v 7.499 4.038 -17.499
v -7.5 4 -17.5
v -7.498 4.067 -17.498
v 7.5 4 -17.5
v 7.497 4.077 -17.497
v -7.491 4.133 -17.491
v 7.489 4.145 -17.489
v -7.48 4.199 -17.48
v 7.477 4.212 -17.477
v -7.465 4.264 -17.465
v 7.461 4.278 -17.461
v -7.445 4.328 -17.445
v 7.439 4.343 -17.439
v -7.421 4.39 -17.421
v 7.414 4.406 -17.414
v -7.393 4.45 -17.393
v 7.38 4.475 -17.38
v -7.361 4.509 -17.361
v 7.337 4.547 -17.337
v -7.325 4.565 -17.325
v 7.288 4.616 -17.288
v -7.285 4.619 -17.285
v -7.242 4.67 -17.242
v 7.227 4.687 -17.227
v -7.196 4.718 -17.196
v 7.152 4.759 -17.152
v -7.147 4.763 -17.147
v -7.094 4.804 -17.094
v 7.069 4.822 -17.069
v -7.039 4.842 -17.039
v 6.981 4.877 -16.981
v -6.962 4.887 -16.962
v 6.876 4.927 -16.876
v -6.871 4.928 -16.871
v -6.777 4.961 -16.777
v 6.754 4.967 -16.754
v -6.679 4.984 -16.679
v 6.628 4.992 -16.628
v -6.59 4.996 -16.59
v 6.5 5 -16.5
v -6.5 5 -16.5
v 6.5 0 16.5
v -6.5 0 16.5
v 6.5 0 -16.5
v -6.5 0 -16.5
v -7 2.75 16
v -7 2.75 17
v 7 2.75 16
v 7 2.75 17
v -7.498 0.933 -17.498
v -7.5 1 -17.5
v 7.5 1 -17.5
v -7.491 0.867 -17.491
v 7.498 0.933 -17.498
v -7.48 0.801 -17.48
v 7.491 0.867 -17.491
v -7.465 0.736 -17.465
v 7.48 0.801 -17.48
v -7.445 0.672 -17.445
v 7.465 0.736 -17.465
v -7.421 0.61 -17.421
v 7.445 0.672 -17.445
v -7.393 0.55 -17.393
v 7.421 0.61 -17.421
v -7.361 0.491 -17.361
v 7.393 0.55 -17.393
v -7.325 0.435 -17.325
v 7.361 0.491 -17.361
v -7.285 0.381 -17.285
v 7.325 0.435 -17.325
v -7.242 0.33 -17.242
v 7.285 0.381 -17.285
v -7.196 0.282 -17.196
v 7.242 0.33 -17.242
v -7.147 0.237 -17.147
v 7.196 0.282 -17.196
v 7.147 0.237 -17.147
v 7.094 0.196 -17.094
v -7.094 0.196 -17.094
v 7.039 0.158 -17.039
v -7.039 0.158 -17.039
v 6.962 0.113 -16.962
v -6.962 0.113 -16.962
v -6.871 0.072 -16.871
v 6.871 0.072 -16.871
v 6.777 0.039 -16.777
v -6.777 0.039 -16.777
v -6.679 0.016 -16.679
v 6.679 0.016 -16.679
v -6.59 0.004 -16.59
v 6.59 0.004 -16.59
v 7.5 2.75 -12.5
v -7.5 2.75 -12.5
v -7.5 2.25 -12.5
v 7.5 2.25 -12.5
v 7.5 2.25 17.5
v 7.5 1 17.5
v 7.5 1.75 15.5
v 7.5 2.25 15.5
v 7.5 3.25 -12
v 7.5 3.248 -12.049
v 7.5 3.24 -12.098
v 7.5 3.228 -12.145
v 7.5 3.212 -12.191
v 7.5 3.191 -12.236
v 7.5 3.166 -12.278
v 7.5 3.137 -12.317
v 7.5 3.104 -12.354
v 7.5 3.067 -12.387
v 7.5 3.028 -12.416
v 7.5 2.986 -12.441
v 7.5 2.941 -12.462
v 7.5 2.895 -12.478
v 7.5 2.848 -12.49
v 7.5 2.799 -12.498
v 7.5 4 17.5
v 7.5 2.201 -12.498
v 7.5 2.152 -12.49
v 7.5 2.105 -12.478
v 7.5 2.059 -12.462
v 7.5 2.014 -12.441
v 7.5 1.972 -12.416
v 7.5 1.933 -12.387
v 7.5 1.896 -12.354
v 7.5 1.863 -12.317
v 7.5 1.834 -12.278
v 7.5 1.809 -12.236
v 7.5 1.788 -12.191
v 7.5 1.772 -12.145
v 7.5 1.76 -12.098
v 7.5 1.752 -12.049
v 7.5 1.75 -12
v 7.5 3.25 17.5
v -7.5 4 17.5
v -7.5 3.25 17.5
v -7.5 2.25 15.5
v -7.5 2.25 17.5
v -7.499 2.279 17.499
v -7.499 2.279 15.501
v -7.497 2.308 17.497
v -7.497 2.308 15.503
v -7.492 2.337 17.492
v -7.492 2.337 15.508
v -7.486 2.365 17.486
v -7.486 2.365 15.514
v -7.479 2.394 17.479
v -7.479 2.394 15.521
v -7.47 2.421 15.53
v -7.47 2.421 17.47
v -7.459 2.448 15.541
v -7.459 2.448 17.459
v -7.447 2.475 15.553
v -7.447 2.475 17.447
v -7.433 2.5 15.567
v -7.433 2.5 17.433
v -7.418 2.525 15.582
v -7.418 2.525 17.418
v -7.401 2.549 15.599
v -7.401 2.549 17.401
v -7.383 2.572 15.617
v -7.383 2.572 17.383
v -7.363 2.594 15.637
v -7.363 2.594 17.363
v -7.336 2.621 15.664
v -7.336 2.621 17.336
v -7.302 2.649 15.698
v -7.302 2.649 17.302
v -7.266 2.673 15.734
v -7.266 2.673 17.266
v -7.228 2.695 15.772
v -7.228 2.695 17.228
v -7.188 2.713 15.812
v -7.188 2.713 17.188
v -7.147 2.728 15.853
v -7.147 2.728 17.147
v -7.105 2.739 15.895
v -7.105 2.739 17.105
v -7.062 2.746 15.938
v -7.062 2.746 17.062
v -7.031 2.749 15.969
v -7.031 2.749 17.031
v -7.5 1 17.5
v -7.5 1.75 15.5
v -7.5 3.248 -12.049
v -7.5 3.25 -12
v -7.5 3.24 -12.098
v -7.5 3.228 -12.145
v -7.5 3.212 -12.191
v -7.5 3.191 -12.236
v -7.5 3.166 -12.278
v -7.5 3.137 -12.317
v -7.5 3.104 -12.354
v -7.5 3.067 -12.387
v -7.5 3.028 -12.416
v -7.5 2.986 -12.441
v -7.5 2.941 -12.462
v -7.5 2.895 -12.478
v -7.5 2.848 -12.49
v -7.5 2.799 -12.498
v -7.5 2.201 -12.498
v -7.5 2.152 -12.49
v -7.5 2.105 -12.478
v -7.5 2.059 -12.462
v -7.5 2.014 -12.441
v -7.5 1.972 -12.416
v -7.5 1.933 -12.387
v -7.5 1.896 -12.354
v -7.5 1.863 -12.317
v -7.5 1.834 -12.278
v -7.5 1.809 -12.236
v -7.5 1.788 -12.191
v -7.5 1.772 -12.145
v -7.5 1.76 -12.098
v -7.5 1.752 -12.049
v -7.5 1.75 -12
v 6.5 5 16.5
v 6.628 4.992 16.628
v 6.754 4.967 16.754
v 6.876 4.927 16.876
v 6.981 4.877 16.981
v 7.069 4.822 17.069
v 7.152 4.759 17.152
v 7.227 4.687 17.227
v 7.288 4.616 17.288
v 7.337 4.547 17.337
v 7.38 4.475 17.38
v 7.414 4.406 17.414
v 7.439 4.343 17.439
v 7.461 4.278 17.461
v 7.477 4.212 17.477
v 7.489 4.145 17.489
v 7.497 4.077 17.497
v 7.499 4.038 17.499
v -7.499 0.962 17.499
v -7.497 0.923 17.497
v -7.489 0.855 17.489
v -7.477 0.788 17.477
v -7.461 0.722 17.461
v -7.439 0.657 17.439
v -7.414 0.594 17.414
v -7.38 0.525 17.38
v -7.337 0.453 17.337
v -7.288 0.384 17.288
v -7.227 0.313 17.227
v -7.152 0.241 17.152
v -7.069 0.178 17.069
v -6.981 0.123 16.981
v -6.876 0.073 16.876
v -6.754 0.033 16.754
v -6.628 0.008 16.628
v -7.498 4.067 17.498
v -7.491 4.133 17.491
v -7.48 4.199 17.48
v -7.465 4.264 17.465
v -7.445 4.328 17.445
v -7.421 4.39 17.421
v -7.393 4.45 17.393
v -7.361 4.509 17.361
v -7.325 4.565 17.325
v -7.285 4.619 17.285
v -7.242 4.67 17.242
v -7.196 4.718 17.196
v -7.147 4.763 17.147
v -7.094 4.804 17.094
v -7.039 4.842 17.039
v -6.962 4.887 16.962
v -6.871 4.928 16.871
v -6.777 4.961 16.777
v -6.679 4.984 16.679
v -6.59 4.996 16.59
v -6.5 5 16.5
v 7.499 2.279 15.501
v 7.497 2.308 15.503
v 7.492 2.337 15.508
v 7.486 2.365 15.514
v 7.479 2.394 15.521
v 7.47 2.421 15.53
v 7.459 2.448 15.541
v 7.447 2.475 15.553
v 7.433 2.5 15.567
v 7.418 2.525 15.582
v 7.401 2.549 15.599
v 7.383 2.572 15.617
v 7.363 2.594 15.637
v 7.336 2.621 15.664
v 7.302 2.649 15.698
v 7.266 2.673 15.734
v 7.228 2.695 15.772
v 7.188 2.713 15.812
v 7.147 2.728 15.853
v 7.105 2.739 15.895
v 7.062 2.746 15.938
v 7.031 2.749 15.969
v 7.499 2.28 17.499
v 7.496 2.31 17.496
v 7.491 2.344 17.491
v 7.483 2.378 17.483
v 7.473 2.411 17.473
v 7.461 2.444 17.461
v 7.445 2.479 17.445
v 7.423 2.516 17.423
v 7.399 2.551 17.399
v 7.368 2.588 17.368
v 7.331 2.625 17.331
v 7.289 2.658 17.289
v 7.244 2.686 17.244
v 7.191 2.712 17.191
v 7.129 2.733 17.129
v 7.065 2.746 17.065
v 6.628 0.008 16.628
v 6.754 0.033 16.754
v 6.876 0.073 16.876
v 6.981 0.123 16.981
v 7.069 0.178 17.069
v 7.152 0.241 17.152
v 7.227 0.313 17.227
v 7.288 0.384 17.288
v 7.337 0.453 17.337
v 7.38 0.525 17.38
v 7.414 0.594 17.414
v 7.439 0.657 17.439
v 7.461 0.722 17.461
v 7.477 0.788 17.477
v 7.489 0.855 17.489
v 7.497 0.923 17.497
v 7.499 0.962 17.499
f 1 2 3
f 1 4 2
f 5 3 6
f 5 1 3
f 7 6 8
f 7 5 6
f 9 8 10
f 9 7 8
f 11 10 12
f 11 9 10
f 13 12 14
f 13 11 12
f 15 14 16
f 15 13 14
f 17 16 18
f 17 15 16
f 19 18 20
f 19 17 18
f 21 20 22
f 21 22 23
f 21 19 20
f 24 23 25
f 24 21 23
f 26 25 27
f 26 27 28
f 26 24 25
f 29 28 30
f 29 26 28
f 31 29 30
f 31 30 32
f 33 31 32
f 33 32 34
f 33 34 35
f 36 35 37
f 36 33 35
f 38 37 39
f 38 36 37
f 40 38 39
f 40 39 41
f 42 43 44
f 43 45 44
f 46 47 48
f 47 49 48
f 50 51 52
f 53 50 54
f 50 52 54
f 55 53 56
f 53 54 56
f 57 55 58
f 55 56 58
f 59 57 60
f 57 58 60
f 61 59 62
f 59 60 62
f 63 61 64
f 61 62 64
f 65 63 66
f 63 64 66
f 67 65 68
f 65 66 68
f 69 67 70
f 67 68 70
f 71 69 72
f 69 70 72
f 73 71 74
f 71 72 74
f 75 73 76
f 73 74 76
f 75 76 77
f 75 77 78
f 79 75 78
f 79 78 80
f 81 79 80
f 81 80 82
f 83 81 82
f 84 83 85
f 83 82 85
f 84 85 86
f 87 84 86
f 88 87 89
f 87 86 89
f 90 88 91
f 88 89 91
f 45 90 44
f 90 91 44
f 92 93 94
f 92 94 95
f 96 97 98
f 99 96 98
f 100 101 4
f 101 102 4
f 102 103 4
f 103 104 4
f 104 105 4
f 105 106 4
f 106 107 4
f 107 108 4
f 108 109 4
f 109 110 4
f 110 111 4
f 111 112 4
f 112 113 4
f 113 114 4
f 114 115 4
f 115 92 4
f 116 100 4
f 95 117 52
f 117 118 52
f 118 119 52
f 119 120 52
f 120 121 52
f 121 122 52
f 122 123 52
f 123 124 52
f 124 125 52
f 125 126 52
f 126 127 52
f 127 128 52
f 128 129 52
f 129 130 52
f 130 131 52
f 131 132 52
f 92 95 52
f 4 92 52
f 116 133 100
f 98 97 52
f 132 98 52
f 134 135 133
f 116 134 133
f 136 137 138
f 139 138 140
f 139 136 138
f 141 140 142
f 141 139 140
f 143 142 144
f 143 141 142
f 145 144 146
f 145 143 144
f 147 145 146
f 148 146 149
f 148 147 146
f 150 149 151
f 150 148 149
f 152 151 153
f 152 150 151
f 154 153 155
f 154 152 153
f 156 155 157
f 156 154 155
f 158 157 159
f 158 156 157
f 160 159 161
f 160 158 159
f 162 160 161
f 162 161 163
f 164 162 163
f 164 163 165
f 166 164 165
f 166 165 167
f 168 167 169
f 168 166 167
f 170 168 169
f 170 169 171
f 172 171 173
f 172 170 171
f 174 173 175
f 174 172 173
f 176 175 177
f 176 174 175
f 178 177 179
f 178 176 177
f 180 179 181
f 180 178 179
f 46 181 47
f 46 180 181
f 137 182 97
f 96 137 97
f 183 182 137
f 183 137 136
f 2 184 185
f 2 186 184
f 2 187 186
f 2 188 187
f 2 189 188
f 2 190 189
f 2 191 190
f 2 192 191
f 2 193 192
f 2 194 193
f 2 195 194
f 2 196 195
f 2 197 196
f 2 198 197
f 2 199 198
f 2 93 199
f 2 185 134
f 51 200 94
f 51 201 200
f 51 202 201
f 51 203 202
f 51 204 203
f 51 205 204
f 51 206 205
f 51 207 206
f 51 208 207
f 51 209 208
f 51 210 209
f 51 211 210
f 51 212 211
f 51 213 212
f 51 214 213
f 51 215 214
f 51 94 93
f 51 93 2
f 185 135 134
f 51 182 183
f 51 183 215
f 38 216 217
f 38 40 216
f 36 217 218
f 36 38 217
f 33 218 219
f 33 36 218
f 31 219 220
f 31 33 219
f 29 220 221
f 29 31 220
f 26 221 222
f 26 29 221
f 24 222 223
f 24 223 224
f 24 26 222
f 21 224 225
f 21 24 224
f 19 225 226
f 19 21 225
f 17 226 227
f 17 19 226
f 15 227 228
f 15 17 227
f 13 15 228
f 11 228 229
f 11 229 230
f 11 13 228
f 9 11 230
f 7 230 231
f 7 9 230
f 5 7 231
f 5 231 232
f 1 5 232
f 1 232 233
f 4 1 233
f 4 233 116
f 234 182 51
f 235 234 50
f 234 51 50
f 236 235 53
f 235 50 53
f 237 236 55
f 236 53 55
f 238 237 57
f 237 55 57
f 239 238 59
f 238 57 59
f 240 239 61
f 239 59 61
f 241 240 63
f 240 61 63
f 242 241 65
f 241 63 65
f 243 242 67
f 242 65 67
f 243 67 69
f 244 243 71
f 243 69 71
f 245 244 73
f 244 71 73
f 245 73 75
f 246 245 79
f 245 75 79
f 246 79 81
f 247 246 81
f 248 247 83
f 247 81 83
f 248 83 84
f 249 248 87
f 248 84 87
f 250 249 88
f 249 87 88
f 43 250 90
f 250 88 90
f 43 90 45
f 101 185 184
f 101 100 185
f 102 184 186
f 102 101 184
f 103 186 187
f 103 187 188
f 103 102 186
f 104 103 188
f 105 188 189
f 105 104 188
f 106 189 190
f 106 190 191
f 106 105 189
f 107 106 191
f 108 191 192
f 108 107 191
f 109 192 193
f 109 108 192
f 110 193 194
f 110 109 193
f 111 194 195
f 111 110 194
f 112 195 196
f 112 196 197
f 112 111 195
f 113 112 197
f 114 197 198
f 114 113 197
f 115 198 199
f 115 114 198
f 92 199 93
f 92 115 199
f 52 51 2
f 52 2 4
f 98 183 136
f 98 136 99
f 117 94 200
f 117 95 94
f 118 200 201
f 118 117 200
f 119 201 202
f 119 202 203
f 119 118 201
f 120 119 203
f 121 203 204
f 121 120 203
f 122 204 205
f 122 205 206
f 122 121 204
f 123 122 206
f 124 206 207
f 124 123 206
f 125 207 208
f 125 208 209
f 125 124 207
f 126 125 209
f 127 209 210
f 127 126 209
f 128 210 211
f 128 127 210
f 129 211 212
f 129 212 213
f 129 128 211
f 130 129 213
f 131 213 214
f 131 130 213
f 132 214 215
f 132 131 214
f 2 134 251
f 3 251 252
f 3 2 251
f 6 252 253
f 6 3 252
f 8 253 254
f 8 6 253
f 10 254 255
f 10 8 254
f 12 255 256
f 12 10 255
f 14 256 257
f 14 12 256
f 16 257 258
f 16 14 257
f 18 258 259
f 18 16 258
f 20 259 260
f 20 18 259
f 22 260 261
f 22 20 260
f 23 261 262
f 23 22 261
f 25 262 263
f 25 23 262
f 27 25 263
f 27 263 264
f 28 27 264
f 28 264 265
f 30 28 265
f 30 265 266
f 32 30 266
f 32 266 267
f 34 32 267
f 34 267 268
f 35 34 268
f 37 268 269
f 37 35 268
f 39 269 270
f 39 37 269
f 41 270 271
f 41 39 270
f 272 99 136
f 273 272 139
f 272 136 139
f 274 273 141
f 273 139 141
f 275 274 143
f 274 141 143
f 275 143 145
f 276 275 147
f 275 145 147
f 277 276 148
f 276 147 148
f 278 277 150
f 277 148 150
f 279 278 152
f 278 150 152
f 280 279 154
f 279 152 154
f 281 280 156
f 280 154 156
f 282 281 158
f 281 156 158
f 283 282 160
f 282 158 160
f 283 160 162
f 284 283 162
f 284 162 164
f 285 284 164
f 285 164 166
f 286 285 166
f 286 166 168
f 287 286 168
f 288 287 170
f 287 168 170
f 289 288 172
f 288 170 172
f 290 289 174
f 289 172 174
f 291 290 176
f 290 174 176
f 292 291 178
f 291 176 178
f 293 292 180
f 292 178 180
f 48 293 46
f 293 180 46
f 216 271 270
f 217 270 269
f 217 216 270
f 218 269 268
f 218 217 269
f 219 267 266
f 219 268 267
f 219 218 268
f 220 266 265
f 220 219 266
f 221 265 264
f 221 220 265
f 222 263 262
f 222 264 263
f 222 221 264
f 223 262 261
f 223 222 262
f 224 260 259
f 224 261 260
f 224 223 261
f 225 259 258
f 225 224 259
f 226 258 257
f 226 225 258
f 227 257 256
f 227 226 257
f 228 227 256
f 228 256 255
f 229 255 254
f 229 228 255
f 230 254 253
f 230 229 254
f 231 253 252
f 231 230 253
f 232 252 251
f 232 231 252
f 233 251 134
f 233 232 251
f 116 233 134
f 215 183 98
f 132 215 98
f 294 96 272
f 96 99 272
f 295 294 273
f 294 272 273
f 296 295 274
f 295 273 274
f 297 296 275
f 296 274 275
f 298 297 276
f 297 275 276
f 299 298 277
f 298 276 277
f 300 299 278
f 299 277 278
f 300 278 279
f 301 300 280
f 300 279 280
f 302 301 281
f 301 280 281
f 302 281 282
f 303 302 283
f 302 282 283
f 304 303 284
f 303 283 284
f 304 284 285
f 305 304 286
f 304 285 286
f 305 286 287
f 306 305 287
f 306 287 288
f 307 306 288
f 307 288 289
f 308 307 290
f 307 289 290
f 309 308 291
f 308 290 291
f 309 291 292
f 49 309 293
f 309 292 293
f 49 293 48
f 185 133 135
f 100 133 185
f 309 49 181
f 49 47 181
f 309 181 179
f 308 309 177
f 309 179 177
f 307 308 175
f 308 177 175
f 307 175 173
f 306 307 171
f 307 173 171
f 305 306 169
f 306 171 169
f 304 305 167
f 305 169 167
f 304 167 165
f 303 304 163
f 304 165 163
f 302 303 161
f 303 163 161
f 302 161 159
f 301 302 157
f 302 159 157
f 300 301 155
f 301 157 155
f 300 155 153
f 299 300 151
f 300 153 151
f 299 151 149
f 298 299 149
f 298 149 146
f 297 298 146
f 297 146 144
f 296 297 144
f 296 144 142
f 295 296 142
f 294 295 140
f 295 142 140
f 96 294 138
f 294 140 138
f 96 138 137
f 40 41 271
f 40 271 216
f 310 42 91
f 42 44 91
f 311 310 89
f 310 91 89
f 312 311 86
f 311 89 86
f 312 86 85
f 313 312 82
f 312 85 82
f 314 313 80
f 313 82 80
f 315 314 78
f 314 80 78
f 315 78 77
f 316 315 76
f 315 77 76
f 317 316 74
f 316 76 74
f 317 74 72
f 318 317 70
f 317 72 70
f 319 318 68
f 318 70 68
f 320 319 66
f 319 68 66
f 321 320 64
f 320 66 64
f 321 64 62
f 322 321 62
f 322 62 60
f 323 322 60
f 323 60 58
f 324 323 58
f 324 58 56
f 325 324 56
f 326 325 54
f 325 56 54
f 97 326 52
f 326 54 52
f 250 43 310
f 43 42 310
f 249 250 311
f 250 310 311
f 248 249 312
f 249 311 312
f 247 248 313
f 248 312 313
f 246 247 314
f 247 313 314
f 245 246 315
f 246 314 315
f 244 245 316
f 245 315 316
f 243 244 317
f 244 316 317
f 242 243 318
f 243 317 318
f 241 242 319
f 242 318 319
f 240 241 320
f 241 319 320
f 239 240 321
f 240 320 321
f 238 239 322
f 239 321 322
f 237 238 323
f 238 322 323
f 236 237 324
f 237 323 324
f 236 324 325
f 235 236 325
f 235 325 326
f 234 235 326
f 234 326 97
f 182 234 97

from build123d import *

# Parameters (mm, degrees)
SKETCH1_W           = 15
SKETCH1_H           = 35
BOSS_EXTRUDE1_DEPTH = 5
SKETCH4_W           = 15
SKETCH4_H           = 1.5
CUT_EXTRUDE1_DEPTH  = 30
FILLET1_R           = 1
FILLET2_R           = 1
FILLET3_R           = 0.5
FILLET4_R           = 0.5
SKETCH5_W           = 15
SKETCH5_H           = 2
BOSS_EXTRUDE2_DEPTH = 1.5
SKETCH8_W           = 2
SKETCH8_H           = 0.5
CUT_EXTRUDE3_DEPTH  = 15
FILLET5_R           = 0.5


with BuildPart() as part:
    # Sketch1 → Boss-Extrude1 (new body)
    with BuildSketch(Plane(origin=(0, 0, 0), x_dir=(1, 0, 0), z_dir=(0, 1, 0))):
        Rectangle(SKETCH1_W, SKETCH1_H)
    extrude(amount=BOSS_EXTRUDE1_DEPTH)

    # Sketch4 → Cut-Extrude1 (cut)
    with BuildSketch(Plane.XY.offset(17.5)):
        with Locations((0, 2.5)):
            Rectangle(SKETCH4_W, SKETCH4_H)
    extrude(amount=-CUT_EXTRUDE1_DEPTH, mode=Mode.SUBTRACT)

    # Fillet1
    fillet1_edges = [part.edges().sort_by_distance(p)[0] for p in [
        (-7.5, 5, 0),
        (0, 5, 17.5),
        (7.5, 5, 0),
        (0, 5, -17.5),
    ]]
    fillet(fillet1_edges, radius=FILLET1_R)

    # Fillet2
    fillet2_edges = [part.edges().sort_by_distance(p)[0] for p in [
        (0, 0, 17.5),
        (-7.5, 0, 0),
        (0, 0, -17.5),
        (7.5, 0, 0),
    ]]
    fillet(fillet2_edges, radius=FILLET2_R)

    # Fillet3
    fillet3_edges = [part.edges().sort_by_distance(p)[0] for p in [
        (0, 3.25, -12.5),
    ]]
    fillet(fillet3_edges, radius=FILLET3_R)

    # Fillet4
    fillet4_edges = [part.edges().sort_by_distance(p)[0] for p in [
        (0, 1.75, -12.5),
    ]]
    fillet(fillet4_edges, radius=FILLET4_R)

    # Sketch5 → Boss-Extrude2 (add)
    with BuildSketch(Plane(origin=(0, 1.75, 0), x_dir=(1, 0, 0), z_dir=(0, 1, 0))):
        with Locations((0, -16.5)):
            Rectangle(SKETCH5_W, SKETCH5_H)
    extrude(amount=BOSS_EXTRUDE2_DEPTH)

    # Sketch8 → Cut-Extrude3 (cut)
    with BuildSketch(Plane(origin=(7.5, 0, 0), x_dir=(0, 0, -1), z_dir=(1, 0, 0))):
        with Locations((-16.5, 3)):
            Rectangle(SKETCH8_W, SKETCH8_H)
    extrude(amount=-CUT_EXTRUDE3_DEPTH, mode=Mode.SUBTRACT)

    # Fillet5
    fillet5_edges = [part.edges().sort_by_distance(p)[0] for p in [
        (-7.5, 2.75, 16.5),
        (0, 2.75, 15.5),
        (0, 2.75, 17.5),
        (7.5, 2.75, 16.5),
    ]]
    fillet(fillet5_edges, radius=FILLET5_R)


solid = part.part
